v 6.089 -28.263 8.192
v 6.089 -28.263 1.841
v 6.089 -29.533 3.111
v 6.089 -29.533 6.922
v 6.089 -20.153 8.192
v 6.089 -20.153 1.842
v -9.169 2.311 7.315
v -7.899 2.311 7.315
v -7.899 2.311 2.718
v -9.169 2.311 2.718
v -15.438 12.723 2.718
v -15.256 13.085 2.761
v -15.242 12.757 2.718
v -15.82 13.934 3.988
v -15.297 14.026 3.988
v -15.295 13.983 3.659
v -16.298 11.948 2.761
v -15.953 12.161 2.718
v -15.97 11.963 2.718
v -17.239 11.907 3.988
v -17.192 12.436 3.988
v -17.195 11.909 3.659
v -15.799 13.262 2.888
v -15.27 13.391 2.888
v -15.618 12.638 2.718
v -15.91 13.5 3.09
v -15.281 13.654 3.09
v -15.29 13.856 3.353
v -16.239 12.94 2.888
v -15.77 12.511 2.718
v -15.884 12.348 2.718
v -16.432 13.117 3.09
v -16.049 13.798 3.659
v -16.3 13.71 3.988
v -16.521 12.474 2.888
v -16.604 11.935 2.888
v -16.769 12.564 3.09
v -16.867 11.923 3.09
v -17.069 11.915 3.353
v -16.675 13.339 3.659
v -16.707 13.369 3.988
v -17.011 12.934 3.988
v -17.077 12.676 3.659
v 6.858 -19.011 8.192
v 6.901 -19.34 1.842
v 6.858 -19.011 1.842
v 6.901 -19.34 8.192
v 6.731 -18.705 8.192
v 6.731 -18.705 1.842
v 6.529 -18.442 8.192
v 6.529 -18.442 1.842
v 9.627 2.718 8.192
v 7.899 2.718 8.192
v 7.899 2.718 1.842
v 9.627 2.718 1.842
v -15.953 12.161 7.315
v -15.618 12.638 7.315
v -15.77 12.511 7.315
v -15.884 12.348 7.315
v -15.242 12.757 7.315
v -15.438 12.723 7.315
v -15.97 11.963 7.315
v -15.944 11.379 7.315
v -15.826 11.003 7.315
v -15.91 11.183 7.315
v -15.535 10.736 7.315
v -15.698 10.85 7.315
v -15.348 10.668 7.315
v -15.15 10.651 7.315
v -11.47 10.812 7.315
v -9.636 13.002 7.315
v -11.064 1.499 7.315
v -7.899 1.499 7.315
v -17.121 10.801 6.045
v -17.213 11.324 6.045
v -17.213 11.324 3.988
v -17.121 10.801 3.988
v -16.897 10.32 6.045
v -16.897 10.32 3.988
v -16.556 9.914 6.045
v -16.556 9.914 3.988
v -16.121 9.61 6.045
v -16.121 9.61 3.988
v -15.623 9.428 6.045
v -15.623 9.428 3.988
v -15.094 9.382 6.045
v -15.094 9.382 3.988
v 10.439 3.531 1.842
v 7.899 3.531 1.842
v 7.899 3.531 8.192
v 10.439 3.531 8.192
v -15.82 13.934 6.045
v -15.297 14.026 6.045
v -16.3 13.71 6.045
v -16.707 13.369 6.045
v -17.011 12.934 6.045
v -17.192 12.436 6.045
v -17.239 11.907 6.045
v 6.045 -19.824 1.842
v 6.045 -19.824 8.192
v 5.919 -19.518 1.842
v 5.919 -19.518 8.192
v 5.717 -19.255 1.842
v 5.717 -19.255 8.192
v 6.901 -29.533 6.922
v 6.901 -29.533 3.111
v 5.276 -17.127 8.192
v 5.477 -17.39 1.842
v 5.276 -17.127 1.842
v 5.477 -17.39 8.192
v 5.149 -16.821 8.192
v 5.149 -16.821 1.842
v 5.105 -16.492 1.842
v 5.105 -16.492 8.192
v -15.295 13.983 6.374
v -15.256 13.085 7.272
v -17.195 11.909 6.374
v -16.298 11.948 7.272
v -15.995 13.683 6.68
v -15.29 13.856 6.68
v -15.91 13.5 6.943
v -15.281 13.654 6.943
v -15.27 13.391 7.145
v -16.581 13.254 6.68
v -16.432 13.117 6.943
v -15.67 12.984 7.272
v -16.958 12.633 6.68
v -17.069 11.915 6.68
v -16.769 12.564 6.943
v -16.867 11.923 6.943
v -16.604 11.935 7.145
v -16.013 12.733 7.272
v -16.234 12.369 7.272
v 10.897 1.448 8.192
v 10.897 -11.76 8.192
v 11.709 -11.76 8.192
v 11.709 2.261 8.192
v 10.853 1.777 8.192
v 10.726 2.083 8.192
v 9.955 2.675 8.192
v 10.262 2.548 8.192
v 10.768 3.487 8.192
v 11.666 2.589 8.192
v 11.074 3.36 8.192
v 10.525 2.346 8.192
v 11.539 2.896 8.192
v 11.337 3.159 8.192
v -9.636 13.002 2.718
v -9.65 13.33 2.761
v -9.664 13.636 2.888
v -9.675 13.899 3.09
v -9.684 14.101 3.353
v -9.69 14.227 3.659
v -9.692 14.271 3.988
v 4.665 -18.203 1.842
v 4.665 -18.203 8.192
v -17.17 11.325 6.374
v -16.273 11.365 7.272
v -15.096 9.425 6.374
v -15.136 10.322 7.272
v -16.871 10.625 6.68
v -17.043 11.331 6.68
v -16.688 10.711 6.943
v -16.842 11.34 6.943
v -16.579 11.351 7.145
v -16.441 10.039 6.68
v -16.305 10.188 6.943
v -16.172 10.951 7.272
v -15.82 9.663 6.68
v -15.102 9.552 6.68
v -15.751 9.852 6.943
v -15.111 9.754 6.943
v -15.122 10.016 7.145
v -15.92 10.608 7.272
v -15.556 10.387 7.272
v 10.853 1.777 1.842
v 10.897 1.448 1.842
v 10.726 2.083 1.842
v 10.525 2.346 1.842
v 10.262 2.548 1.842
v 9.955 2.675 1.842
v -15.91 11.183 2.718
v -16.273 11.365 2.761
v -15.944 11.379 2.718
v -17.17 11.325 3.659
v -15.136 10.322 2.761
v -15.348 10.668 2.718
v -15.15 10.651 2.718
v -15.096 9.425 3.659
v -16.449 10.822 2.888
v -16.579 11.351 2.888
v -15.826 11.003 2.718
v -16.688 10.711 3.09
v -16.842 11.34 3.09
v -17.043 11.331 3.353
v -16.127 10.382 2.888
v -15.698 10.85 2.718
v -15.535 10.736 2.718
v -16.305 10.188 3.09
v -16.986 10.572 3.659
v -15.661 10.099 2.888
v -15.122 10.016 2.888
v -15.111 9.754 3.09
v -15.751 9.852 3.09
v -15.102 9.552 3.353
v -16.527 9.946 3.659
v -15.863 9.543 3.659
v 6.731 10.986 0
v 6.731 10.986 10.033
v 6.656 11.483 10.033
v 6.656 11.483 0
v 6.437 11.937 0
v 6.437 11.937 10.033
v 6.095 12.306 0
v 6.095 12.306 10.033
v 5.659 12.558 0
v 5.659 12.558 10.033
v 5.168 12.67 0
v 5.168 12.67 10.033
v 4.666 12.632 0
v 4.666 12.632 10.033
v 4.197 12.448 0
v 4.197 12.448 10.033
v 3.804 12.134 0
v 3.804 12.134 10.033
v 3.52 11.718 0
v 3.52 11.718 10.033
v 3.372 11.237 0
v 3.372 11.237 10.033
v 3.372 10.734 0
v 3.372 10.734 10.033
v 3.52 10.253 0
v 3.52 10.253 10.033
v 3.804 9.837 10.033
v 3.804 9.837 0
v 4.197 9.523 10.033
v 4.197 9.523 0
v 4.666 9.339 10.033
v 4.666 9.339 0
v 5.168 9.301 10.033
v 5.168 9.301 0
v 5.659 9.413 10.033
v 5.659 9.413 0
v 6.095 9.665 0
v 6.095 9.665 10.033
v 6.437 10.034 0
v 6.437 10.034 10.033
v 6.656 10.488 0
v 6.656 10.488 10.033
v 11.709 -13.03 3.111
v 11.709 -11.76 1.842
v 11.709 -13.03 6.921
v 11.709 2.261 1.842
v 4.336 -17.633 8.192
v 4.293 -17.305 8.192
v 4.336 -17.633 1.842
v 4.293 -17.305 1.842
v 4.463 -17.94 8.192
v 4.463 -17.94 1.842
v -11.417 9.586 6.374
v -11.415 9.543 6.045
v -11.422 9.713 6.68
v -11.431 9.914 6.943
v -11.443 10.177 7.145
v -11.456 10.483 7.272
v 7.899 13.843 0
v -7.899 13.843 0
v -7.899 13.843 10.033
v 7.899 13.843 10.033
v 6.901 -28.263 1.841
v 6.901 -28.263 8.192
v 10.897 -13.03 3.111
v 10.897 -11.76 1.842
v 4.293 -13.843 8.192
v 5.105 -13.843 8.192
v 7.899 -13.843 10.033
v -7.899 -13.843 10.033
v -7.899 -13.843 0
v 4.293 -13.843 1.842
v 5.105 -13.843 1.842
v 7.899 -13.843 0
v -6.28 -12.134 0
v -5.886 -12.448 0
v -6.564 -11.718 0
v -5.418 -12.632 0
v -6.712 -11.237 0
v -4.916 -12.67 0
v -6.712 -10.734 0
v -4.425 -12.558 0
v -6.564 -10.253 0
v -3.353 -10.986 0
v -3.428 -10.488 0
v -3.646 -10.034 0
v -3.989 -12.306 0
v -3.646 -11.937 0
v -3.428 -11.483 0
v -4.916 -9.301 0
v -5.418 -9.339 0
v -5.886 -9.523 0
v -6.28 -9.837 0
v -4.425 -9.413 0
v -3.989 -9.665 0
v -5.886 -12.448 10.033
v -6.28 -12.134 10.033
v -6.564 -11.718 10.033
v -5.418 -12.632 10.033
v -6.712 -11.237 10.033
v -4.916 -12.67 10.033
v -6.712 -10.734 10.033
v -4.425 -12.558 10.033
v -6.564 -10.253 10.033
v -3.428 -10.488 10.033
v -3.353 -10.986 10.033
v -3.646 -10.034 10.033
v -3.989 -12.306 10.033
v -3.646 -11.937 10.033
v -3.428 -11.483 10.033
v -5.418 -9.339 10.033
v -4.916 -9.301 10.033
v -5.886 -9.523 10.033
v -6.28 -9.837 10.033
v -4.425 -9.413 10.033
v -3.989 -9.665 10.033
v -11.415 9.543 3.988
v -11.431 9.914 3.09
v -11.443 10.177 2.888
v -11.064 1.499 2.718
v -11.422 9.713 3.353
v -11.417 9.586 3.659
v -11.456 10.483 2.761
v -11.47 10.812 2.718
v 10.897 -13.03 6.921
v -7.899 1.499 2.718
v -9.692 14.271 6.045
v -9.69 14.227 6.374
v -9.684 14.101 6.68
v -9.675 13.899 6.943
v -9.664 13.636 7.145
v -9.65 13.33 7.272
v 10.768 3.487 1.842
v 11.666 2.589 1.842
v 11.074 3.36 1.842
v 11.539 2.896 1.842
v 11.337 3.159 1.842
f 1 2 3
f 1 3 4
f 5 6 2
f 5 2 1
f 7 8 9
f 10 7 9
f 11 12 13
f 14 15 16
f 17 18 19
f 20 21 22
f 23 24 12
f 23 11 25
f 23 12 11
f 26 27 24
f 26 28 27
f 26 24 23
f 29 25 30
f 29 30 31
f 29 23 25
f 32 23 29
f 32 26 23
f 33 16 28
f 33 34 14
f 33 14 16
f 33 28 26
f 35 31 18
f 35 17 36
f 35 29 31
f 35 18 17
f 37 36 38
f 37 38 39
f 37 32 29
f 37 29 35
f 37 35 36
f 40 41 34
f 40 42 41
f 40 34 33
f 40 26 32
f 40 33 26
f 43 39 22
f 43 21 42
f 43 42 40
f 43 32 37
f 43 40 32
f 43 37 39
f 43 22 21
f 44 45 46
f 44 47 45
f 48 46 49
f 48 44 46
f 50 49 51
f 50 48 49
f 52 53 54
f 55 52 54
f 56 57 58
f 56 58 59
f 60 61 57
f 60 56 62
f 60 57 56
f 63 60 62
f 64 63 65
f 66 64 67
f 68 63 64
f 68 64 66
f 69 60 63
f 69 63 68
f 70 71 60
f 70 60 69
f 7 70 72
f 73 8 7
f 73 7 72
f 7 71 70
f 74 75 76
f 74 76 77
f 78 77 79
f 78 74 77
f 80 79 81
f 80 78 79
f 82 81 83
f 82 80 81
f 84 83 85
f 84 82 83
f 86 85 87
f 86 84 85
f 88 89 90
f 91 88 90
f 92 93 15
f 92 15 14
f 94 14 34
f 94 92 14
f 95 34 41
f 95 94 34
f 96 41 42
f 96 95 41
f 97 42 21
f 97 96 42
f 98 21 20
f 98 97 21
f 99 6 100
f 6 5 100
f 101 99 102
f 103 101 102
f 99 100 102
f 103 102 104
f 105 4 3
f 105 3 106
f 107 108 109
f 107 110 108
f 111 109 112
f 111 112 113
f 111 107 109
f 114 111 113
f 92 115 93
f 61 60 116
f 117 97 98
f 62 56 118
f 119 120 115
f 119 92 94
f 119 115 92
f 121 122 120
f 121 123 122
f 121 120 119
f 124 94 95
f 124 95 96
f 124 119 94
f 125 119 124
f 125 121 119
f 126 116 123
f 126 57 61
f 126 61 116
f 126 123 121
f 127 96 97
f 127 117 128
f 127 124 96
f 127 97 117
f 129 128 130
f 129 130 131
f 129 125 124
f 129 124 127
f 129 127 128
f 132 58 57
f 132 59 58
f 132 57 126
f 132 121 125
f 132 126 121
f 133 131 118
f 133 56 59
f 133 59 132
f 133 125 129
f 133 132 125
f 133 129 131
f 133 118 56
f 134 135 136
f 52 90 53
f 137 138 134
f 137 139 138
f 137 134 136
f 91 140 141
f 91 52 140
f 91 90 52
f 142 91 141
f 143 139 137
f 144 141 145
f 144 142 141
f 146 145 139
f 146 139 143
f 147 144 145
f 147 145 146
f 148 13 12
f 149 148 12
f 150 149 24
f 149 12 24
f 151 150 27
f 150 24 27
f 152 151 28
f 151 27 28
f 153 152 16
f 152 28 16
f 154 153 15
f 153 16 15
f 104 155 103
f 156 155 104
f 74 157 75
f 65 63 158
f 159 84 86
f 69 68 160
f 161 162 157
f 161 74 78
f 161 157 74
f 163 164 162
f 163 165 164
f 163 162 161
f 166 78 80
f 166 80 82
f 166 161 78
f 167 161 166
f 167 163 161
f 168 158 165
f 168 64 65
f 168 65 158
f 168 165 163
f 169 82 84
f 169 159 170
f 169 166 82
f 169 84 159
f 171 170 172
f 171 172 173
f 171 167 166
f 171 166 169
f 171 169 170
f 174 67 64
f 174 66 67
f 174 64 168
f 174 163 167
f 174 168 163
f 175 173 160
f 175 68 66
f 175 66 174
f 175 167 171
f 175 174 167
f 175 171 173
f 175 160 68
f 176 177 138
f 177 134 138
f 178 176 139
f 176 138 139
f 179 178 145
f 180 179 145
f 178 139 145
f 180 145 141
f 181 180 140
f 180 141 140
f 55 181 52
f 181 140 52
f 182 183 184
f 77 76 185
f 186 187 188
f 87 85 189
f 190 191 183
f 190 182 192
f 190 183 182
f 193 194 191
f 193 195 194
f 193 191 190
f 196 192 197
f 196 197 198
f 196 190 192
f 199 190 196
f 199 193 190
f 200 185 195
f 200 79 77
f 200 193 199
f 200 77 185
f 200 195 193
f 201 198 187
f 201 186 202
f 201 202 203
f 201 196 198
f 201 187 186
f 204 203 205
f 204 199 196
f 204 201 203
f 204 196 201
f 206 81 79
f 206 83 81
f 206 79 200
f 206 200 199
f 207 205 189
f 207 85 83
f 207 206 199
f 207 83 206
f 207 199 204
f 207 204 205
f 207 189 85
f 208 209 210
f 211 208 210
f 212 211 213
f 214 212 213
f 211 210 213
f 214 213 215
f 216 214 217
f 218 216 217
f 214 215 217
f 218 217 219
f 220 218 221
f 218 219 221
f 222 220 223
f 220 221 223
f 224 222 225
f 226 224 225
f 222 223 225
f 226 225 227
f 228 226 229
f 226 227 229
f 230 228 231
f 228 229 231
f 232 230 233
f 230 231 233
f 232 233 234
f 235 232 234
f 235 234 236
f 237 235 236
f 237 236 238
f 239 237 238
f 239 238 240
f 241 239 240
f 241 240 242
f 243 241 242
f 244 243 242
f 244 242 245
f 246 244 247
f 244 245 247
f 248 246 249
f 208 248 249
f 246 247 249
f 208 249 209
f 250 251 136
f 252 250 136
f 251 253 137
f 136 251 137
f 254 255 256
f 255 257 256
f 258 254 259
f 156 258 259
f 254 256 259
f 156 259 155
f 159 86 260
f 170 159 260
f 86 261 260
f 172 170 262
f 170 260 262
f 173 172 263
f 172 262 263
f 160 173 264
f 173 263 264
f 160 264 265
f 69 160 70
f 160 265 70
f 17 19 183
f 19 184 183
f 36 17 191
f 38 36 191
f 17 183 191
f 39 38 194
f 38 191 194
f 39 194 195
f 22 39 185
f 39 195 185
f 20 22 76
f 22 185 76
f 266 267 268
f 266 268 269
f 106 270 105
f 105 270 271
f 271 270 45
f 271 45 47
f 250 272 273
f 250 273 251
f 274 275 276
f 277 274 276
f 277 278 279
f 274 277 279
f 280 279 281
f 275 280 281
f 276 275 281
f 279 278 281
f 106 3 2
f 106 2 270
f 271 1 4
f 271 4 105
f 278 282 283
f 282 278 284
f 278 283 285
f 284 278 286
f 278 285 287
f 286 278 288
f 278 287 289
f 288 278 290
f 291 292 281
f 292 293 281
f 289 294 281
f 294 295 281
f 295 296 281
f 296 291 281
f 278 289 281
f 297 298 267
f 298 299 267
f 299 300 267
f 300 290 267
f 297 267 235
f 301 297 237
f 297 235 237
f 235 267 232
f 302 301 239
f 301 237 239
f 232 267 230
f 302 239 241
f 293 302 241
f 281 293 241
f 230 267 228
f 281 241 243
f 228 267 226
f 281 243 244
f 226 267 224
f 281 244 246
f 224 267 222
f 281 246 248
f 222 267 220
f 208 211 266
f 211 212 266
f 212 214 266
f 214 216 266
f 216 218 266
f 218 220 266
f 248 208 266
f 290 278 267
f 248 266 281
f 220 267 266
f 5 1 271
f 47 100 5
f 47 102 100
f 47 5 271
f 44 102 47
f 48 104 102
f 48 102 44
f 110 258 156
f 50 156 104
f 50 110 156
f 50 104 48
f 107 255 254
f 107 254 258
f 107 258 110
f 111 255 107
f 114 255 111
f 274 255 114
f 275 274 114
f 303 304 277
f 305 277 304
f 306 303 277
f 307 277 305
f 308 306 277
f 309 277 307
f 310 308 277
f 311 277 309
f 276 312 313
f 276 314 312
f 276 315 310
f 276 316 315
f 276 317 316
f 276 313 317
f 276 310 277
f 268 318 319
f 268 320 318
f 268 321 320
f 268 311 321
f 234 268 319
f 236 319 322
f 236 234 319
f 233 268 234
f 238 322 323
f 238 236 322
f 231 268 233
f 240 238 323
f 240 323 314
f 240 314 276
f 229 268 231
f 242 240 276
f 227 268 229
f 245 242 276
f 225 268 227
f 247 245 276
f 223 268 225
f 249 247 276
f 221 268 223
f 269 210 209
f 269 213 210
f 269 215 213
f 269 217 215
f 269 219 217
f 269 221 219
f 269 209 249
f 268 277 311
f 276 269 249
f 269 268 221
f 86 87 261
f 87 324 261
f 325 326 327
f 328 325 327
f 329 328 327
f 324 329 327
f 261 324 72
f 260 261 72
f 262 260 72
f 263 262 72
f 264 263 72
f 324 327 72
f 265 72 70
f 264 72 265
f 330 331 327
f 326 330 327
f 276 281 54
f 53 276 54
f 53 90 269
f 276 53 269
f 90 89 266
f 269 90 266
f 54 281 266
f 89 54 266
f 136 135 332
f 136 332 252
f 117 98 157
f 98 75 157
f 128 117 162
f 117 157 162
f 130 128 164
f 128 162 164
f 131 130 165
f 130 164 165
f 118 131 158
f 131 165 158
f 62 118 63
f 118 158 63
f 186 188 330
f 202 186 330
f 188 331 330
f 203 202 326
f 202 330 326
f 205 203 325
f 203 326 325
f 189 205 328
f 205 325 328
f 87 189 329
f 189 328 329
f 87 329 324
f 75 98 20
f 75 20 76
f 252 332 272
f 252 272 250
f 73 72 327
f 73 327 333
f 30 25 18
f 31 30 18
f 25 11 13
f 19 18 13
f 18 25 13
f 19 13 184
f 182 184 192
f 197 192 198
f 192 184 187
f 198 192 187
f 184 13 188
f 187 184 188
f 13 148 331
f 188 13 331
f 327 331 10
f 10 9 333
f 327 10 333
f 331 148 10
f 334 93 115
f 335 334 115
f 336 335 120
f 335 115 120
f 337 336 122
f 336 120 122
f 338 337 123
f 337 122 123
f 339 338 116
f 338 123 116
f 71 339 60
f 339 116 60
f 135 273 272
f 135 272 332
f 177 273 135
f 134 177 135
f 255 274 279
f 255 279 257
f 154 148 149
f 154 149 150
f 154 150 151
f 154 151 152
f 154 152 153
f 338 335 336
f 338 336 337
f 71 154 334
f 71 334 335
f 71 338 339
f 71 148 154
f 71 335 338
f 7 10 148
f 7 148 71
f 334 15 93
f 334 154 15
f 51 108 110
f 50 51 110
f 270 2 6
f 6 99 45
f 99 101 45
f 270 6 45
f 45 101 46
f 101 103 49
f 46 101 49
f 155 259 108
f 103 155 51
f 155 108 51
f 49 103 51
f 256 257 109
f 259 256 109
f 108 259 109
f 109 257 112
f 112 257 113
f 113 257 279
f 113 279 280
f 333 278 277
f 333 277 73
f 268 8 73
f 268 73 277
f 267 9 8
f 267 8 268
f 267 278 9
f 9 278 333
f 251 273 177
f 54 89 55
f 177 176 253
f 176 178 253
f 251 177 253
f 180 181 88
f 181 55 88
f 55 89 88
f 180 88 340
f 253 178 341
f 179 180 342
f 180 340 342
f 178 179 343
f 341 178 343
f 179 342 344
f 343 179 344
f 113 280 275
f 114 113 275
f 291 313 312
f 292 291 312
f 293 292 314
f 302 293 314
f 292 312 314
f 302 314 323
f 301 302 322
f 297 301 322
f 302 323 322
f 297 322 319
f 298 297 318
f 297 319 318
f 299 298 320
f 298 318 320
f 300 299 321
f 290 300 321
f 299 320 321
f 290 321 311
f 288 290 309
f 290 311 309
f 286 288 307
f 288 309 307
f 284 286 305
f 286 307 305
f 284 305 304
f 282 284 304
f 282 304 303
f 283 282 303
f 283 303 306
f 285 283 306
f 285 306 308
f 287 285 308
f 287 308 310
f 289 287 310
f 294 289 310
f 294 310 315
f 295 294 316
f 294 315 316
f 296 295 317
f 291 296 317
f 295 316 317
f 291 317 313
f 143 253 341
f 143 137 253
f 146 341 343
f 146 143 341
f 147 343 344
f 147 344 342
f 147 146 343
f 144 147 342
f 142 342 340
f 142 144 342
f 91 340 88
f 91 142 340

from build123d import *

# Parameters (mm, degrees)
F0_W      = 15.7988
F0_H      = 27.686
F1_DEPTH  = 10.033
F2_R      = 1.6891
F3_DEPTH  = 10.033
F4_W      = 0.8128
F4_H      = 3.175
F5_DEPTH  = 3.81
F6_W      = 0.8128
F6_H      = 6.35
F7_DEPTH  = 15.748
F8_R      = 1.27
F9_SIZE   = 1.27
F10_W     = 0.8128
F10_H     = 3.175
F11_DEPTH = 3.175
F13_DEPTH = 6.35
F14_W     = 1.1494727835
F14_H     = 6.35
F15_DEPTH = 2.54
F17_DEPTH = 6.35
F18_W     = 0.8128
F18_H     = 6.35
F19_DEPTH = 9.906
F20_R     = 1.27
F21_SIZE  = 1.27
F22_W     = 0.8128
F22_H     = 2.2987
F23_DEPTH = 1.27
F25_DEPTH = 4.5974
F26_W     = 1.9280109734
F26_H     = 4.5974
F27_DEPTH = 12.7
F28_W     = 4.6482
F28_H     = 4.5974
F29_DEPTH = 5.715
F30_R     = 2.032
F31_R     = 1.27


with BuildPart() as f1:
    # F0 (on Top) → F1 (new body)
    with BuildSketch(Plane.XY):
        Rectangle(F0_W, F0_H)
    extrude(amount=F1_DEPTH)

    # F2 (on face) → F3 (cut, through all)
    with BuildSketch(Plane.XY.offset(10.033)):
        with Locations((5.0419, 10.9855)):
            Circle(F2_R)
        with Locations((-5.0419, -10.9855)):
            Circle(F2_R)
    extrude(amount=-F3_DEPTH, mode=Mode.SUBTRACT)

    # F4 (on face) → F5 (join)
    with BuildSketch(Plane.YZ.offset(7.8994)):
        with Locations((3.1242, 6.604)):
            Rectangle(F4_W, F4_H)
        with Locations((3.1242, 3.429)):
            Rectangle(F4_W, F4_H)
    extrude(amount=F5_DEPTH)

    # F6 (on face) → F7 (join)
    with BuildSketch(Plane.XZ.offset(-2.7178)):
        with Locations((11.303, 5.0165)):
            Rectangle(F6_W, F6_H)
    extrude(amount=F7_DEPTH)

    # F8
    f8_edges = [f1.edges().sort_by_distance(p)[0] for p in [
        (11.7094, 3.5306, 5.0165),
        (10.8966, 2.7178, 5.0165),
    ]]
    fillet(f8_edges, radius=F8_R)

    # F9
    f9_edges = [f1.edges().sort_by_distance(p)[0] for p in [
        (11.303, -13.0302, 8.1915),
        (11.303, -13.0302, 1.8415),
    ]]
    chamfer(f9_edges, length=F9_SIZE)

    # F10 (on face) → F11 (join)
    with BuildSketch(Plane.XZ.offset(13.843)):
        with Locations((4.699, 6.604)):
            Rectangle(F10_W, F10_H)
        with Locations((4.699, 3.429)):
            Rectangle(F10_W, F10_H)
    extrude(amount=F11_DEPTH)

    # F12 (on face) → F13 (join, through all)
    with BuildSketch(Plane.XY.offset(8.1915)):
        Polygon((4.2926, -17.8308), (5.1054, -17.018), (4.2926, -17.018), align=None)
    extrude(amount=-F13_DEPTH)

    # F14 (on face) → F15 (join)
    with BuildSketch(Plane(origin=(11.0617, -11.0617, 0), x_dir=(0.7071067812, 0.7071067812, 0), z_dir=(0.7071067812, -0.7071067812, 0))):
        with Locations((-8.9982166333, 5.0165)):
            Rectangle(F14_W, F14_H)
    extrude(amount=F15_DEPTH)

    # F16 (on face) → F17 (join, through all)
    with BuildSketch(Plane.XY.offset(8.1915)):
        Polygon((6.9014512242, -19.6268512242), (6.9014512242, -18.8140512242), (6.0886512242, -19.6268512242), align=None)
    extrude(amount=-F17_DEPTH)

    # F18 (on face) → F19 (join)
    with BuildSketch(Plane.XZ.offset(19.6268512242)):
        with Locations((6.4950512242, 5.0165)):
            Rectangle(F18_W, F18_H)
    extrude(amount=F19_DEPTH)

    # F20
    f20_edges = [f1.edges().sort_by_distance(p)[0] for p in [
        (4.2926, -17.8308, 5.0165),
        (5.1054, -17.018, 5.0165),
        (6.901451, -18.814051, 5.0165),
        (6.088651, -19.626851, 5.0165),
    ]]
    fillet(f20_edges, radius=F20_R)

    # F21
    f21_edges = [f1.edges().sort_by_distance(p)[0] for p in [
        (6.495051, -29.532851, 1.8415),
        (6.495051, -29.532851, 8.1915),
    ]]
    chamfer(f21_edges, length=F21_SIZE)

    # F22 (on face) → F23 (join)
    with BuildSketch(Plane(origin=(-7.8994, 0, 0), x_dir=(0, -1, 0), z_dir=(-1, 0, 0))):
        with Locations((-1.905, 3.86715)):
            Rectangle(F22_W, F22_H)
        with Locations((-1.905, 6.16585)):
            Rectangle(F22_W, F22_H)
    extrude(amount=F23_DEPTH)

    # F24 (on face) → F25 (join, through all)
    with BuildSketch(Plane.XY.offset(7.3152)):
        Polygon((-9.1694, 1.4986), (-9.1694, 1.5813095502), (-11.0637601465, 1.4986), align=None)
    extrude(amount=-F25_DEPTH)

    # F26 (on face) → F27 (join)
    with BuildSketch(Plane(origin=(-0.0863562718, 1.9778838039, 0), x_dir=(-0.9990482216, -0.0436193874, 0), z_dir=(-0.0436193874, 0.9990482216, 0))):
        with Locations((10.0238563977, 5.0165)):
            Rectangle(F26_W, F26_H)
    extrude(amount=F27_DEPTH)

    # F28 (on face) → F29 (join)
    with BuildSketch(Plane(origin=(-10.9774038747, -0.4792838039, 0), x_dir=(0.0436193874, -0.9990482216, 0), z_dir=(-0.9990482216, -0.0436193874, 0))):
        with Locations((-12.3556681044, 5.0165)):
            Rectangle(F28_W, F28_H)
    extrude(amount=F29_DEPTH)

    # F30
    f30_edges = [f1.edges().sort_by_distance(p)[0] for p in [
        (-17.124535, 9.293452, 5.0165),
        (-17.327287, 13.937228, 5.0165),
    ]]
    fillet(f30_edges, radius=F30_R)

    # F31
    f31_edges = [f1.edges().sort_by_distance(p)[0] for p in [
        (-16.706734, 13.368596, 7.3152),
        (-16.555903, 9.914005, 7.3152),
        (-17.225911, 11.61534, 7.3152),
        (-17.225911, 11.61534, 2.7178),
        (-16.555903, 9.914005, 2.7178),
        (-16.706734, 13.368596, 2.7178),
    ]]
    fillet(f31_edges, radius=F31_R)


solid = f1.part
